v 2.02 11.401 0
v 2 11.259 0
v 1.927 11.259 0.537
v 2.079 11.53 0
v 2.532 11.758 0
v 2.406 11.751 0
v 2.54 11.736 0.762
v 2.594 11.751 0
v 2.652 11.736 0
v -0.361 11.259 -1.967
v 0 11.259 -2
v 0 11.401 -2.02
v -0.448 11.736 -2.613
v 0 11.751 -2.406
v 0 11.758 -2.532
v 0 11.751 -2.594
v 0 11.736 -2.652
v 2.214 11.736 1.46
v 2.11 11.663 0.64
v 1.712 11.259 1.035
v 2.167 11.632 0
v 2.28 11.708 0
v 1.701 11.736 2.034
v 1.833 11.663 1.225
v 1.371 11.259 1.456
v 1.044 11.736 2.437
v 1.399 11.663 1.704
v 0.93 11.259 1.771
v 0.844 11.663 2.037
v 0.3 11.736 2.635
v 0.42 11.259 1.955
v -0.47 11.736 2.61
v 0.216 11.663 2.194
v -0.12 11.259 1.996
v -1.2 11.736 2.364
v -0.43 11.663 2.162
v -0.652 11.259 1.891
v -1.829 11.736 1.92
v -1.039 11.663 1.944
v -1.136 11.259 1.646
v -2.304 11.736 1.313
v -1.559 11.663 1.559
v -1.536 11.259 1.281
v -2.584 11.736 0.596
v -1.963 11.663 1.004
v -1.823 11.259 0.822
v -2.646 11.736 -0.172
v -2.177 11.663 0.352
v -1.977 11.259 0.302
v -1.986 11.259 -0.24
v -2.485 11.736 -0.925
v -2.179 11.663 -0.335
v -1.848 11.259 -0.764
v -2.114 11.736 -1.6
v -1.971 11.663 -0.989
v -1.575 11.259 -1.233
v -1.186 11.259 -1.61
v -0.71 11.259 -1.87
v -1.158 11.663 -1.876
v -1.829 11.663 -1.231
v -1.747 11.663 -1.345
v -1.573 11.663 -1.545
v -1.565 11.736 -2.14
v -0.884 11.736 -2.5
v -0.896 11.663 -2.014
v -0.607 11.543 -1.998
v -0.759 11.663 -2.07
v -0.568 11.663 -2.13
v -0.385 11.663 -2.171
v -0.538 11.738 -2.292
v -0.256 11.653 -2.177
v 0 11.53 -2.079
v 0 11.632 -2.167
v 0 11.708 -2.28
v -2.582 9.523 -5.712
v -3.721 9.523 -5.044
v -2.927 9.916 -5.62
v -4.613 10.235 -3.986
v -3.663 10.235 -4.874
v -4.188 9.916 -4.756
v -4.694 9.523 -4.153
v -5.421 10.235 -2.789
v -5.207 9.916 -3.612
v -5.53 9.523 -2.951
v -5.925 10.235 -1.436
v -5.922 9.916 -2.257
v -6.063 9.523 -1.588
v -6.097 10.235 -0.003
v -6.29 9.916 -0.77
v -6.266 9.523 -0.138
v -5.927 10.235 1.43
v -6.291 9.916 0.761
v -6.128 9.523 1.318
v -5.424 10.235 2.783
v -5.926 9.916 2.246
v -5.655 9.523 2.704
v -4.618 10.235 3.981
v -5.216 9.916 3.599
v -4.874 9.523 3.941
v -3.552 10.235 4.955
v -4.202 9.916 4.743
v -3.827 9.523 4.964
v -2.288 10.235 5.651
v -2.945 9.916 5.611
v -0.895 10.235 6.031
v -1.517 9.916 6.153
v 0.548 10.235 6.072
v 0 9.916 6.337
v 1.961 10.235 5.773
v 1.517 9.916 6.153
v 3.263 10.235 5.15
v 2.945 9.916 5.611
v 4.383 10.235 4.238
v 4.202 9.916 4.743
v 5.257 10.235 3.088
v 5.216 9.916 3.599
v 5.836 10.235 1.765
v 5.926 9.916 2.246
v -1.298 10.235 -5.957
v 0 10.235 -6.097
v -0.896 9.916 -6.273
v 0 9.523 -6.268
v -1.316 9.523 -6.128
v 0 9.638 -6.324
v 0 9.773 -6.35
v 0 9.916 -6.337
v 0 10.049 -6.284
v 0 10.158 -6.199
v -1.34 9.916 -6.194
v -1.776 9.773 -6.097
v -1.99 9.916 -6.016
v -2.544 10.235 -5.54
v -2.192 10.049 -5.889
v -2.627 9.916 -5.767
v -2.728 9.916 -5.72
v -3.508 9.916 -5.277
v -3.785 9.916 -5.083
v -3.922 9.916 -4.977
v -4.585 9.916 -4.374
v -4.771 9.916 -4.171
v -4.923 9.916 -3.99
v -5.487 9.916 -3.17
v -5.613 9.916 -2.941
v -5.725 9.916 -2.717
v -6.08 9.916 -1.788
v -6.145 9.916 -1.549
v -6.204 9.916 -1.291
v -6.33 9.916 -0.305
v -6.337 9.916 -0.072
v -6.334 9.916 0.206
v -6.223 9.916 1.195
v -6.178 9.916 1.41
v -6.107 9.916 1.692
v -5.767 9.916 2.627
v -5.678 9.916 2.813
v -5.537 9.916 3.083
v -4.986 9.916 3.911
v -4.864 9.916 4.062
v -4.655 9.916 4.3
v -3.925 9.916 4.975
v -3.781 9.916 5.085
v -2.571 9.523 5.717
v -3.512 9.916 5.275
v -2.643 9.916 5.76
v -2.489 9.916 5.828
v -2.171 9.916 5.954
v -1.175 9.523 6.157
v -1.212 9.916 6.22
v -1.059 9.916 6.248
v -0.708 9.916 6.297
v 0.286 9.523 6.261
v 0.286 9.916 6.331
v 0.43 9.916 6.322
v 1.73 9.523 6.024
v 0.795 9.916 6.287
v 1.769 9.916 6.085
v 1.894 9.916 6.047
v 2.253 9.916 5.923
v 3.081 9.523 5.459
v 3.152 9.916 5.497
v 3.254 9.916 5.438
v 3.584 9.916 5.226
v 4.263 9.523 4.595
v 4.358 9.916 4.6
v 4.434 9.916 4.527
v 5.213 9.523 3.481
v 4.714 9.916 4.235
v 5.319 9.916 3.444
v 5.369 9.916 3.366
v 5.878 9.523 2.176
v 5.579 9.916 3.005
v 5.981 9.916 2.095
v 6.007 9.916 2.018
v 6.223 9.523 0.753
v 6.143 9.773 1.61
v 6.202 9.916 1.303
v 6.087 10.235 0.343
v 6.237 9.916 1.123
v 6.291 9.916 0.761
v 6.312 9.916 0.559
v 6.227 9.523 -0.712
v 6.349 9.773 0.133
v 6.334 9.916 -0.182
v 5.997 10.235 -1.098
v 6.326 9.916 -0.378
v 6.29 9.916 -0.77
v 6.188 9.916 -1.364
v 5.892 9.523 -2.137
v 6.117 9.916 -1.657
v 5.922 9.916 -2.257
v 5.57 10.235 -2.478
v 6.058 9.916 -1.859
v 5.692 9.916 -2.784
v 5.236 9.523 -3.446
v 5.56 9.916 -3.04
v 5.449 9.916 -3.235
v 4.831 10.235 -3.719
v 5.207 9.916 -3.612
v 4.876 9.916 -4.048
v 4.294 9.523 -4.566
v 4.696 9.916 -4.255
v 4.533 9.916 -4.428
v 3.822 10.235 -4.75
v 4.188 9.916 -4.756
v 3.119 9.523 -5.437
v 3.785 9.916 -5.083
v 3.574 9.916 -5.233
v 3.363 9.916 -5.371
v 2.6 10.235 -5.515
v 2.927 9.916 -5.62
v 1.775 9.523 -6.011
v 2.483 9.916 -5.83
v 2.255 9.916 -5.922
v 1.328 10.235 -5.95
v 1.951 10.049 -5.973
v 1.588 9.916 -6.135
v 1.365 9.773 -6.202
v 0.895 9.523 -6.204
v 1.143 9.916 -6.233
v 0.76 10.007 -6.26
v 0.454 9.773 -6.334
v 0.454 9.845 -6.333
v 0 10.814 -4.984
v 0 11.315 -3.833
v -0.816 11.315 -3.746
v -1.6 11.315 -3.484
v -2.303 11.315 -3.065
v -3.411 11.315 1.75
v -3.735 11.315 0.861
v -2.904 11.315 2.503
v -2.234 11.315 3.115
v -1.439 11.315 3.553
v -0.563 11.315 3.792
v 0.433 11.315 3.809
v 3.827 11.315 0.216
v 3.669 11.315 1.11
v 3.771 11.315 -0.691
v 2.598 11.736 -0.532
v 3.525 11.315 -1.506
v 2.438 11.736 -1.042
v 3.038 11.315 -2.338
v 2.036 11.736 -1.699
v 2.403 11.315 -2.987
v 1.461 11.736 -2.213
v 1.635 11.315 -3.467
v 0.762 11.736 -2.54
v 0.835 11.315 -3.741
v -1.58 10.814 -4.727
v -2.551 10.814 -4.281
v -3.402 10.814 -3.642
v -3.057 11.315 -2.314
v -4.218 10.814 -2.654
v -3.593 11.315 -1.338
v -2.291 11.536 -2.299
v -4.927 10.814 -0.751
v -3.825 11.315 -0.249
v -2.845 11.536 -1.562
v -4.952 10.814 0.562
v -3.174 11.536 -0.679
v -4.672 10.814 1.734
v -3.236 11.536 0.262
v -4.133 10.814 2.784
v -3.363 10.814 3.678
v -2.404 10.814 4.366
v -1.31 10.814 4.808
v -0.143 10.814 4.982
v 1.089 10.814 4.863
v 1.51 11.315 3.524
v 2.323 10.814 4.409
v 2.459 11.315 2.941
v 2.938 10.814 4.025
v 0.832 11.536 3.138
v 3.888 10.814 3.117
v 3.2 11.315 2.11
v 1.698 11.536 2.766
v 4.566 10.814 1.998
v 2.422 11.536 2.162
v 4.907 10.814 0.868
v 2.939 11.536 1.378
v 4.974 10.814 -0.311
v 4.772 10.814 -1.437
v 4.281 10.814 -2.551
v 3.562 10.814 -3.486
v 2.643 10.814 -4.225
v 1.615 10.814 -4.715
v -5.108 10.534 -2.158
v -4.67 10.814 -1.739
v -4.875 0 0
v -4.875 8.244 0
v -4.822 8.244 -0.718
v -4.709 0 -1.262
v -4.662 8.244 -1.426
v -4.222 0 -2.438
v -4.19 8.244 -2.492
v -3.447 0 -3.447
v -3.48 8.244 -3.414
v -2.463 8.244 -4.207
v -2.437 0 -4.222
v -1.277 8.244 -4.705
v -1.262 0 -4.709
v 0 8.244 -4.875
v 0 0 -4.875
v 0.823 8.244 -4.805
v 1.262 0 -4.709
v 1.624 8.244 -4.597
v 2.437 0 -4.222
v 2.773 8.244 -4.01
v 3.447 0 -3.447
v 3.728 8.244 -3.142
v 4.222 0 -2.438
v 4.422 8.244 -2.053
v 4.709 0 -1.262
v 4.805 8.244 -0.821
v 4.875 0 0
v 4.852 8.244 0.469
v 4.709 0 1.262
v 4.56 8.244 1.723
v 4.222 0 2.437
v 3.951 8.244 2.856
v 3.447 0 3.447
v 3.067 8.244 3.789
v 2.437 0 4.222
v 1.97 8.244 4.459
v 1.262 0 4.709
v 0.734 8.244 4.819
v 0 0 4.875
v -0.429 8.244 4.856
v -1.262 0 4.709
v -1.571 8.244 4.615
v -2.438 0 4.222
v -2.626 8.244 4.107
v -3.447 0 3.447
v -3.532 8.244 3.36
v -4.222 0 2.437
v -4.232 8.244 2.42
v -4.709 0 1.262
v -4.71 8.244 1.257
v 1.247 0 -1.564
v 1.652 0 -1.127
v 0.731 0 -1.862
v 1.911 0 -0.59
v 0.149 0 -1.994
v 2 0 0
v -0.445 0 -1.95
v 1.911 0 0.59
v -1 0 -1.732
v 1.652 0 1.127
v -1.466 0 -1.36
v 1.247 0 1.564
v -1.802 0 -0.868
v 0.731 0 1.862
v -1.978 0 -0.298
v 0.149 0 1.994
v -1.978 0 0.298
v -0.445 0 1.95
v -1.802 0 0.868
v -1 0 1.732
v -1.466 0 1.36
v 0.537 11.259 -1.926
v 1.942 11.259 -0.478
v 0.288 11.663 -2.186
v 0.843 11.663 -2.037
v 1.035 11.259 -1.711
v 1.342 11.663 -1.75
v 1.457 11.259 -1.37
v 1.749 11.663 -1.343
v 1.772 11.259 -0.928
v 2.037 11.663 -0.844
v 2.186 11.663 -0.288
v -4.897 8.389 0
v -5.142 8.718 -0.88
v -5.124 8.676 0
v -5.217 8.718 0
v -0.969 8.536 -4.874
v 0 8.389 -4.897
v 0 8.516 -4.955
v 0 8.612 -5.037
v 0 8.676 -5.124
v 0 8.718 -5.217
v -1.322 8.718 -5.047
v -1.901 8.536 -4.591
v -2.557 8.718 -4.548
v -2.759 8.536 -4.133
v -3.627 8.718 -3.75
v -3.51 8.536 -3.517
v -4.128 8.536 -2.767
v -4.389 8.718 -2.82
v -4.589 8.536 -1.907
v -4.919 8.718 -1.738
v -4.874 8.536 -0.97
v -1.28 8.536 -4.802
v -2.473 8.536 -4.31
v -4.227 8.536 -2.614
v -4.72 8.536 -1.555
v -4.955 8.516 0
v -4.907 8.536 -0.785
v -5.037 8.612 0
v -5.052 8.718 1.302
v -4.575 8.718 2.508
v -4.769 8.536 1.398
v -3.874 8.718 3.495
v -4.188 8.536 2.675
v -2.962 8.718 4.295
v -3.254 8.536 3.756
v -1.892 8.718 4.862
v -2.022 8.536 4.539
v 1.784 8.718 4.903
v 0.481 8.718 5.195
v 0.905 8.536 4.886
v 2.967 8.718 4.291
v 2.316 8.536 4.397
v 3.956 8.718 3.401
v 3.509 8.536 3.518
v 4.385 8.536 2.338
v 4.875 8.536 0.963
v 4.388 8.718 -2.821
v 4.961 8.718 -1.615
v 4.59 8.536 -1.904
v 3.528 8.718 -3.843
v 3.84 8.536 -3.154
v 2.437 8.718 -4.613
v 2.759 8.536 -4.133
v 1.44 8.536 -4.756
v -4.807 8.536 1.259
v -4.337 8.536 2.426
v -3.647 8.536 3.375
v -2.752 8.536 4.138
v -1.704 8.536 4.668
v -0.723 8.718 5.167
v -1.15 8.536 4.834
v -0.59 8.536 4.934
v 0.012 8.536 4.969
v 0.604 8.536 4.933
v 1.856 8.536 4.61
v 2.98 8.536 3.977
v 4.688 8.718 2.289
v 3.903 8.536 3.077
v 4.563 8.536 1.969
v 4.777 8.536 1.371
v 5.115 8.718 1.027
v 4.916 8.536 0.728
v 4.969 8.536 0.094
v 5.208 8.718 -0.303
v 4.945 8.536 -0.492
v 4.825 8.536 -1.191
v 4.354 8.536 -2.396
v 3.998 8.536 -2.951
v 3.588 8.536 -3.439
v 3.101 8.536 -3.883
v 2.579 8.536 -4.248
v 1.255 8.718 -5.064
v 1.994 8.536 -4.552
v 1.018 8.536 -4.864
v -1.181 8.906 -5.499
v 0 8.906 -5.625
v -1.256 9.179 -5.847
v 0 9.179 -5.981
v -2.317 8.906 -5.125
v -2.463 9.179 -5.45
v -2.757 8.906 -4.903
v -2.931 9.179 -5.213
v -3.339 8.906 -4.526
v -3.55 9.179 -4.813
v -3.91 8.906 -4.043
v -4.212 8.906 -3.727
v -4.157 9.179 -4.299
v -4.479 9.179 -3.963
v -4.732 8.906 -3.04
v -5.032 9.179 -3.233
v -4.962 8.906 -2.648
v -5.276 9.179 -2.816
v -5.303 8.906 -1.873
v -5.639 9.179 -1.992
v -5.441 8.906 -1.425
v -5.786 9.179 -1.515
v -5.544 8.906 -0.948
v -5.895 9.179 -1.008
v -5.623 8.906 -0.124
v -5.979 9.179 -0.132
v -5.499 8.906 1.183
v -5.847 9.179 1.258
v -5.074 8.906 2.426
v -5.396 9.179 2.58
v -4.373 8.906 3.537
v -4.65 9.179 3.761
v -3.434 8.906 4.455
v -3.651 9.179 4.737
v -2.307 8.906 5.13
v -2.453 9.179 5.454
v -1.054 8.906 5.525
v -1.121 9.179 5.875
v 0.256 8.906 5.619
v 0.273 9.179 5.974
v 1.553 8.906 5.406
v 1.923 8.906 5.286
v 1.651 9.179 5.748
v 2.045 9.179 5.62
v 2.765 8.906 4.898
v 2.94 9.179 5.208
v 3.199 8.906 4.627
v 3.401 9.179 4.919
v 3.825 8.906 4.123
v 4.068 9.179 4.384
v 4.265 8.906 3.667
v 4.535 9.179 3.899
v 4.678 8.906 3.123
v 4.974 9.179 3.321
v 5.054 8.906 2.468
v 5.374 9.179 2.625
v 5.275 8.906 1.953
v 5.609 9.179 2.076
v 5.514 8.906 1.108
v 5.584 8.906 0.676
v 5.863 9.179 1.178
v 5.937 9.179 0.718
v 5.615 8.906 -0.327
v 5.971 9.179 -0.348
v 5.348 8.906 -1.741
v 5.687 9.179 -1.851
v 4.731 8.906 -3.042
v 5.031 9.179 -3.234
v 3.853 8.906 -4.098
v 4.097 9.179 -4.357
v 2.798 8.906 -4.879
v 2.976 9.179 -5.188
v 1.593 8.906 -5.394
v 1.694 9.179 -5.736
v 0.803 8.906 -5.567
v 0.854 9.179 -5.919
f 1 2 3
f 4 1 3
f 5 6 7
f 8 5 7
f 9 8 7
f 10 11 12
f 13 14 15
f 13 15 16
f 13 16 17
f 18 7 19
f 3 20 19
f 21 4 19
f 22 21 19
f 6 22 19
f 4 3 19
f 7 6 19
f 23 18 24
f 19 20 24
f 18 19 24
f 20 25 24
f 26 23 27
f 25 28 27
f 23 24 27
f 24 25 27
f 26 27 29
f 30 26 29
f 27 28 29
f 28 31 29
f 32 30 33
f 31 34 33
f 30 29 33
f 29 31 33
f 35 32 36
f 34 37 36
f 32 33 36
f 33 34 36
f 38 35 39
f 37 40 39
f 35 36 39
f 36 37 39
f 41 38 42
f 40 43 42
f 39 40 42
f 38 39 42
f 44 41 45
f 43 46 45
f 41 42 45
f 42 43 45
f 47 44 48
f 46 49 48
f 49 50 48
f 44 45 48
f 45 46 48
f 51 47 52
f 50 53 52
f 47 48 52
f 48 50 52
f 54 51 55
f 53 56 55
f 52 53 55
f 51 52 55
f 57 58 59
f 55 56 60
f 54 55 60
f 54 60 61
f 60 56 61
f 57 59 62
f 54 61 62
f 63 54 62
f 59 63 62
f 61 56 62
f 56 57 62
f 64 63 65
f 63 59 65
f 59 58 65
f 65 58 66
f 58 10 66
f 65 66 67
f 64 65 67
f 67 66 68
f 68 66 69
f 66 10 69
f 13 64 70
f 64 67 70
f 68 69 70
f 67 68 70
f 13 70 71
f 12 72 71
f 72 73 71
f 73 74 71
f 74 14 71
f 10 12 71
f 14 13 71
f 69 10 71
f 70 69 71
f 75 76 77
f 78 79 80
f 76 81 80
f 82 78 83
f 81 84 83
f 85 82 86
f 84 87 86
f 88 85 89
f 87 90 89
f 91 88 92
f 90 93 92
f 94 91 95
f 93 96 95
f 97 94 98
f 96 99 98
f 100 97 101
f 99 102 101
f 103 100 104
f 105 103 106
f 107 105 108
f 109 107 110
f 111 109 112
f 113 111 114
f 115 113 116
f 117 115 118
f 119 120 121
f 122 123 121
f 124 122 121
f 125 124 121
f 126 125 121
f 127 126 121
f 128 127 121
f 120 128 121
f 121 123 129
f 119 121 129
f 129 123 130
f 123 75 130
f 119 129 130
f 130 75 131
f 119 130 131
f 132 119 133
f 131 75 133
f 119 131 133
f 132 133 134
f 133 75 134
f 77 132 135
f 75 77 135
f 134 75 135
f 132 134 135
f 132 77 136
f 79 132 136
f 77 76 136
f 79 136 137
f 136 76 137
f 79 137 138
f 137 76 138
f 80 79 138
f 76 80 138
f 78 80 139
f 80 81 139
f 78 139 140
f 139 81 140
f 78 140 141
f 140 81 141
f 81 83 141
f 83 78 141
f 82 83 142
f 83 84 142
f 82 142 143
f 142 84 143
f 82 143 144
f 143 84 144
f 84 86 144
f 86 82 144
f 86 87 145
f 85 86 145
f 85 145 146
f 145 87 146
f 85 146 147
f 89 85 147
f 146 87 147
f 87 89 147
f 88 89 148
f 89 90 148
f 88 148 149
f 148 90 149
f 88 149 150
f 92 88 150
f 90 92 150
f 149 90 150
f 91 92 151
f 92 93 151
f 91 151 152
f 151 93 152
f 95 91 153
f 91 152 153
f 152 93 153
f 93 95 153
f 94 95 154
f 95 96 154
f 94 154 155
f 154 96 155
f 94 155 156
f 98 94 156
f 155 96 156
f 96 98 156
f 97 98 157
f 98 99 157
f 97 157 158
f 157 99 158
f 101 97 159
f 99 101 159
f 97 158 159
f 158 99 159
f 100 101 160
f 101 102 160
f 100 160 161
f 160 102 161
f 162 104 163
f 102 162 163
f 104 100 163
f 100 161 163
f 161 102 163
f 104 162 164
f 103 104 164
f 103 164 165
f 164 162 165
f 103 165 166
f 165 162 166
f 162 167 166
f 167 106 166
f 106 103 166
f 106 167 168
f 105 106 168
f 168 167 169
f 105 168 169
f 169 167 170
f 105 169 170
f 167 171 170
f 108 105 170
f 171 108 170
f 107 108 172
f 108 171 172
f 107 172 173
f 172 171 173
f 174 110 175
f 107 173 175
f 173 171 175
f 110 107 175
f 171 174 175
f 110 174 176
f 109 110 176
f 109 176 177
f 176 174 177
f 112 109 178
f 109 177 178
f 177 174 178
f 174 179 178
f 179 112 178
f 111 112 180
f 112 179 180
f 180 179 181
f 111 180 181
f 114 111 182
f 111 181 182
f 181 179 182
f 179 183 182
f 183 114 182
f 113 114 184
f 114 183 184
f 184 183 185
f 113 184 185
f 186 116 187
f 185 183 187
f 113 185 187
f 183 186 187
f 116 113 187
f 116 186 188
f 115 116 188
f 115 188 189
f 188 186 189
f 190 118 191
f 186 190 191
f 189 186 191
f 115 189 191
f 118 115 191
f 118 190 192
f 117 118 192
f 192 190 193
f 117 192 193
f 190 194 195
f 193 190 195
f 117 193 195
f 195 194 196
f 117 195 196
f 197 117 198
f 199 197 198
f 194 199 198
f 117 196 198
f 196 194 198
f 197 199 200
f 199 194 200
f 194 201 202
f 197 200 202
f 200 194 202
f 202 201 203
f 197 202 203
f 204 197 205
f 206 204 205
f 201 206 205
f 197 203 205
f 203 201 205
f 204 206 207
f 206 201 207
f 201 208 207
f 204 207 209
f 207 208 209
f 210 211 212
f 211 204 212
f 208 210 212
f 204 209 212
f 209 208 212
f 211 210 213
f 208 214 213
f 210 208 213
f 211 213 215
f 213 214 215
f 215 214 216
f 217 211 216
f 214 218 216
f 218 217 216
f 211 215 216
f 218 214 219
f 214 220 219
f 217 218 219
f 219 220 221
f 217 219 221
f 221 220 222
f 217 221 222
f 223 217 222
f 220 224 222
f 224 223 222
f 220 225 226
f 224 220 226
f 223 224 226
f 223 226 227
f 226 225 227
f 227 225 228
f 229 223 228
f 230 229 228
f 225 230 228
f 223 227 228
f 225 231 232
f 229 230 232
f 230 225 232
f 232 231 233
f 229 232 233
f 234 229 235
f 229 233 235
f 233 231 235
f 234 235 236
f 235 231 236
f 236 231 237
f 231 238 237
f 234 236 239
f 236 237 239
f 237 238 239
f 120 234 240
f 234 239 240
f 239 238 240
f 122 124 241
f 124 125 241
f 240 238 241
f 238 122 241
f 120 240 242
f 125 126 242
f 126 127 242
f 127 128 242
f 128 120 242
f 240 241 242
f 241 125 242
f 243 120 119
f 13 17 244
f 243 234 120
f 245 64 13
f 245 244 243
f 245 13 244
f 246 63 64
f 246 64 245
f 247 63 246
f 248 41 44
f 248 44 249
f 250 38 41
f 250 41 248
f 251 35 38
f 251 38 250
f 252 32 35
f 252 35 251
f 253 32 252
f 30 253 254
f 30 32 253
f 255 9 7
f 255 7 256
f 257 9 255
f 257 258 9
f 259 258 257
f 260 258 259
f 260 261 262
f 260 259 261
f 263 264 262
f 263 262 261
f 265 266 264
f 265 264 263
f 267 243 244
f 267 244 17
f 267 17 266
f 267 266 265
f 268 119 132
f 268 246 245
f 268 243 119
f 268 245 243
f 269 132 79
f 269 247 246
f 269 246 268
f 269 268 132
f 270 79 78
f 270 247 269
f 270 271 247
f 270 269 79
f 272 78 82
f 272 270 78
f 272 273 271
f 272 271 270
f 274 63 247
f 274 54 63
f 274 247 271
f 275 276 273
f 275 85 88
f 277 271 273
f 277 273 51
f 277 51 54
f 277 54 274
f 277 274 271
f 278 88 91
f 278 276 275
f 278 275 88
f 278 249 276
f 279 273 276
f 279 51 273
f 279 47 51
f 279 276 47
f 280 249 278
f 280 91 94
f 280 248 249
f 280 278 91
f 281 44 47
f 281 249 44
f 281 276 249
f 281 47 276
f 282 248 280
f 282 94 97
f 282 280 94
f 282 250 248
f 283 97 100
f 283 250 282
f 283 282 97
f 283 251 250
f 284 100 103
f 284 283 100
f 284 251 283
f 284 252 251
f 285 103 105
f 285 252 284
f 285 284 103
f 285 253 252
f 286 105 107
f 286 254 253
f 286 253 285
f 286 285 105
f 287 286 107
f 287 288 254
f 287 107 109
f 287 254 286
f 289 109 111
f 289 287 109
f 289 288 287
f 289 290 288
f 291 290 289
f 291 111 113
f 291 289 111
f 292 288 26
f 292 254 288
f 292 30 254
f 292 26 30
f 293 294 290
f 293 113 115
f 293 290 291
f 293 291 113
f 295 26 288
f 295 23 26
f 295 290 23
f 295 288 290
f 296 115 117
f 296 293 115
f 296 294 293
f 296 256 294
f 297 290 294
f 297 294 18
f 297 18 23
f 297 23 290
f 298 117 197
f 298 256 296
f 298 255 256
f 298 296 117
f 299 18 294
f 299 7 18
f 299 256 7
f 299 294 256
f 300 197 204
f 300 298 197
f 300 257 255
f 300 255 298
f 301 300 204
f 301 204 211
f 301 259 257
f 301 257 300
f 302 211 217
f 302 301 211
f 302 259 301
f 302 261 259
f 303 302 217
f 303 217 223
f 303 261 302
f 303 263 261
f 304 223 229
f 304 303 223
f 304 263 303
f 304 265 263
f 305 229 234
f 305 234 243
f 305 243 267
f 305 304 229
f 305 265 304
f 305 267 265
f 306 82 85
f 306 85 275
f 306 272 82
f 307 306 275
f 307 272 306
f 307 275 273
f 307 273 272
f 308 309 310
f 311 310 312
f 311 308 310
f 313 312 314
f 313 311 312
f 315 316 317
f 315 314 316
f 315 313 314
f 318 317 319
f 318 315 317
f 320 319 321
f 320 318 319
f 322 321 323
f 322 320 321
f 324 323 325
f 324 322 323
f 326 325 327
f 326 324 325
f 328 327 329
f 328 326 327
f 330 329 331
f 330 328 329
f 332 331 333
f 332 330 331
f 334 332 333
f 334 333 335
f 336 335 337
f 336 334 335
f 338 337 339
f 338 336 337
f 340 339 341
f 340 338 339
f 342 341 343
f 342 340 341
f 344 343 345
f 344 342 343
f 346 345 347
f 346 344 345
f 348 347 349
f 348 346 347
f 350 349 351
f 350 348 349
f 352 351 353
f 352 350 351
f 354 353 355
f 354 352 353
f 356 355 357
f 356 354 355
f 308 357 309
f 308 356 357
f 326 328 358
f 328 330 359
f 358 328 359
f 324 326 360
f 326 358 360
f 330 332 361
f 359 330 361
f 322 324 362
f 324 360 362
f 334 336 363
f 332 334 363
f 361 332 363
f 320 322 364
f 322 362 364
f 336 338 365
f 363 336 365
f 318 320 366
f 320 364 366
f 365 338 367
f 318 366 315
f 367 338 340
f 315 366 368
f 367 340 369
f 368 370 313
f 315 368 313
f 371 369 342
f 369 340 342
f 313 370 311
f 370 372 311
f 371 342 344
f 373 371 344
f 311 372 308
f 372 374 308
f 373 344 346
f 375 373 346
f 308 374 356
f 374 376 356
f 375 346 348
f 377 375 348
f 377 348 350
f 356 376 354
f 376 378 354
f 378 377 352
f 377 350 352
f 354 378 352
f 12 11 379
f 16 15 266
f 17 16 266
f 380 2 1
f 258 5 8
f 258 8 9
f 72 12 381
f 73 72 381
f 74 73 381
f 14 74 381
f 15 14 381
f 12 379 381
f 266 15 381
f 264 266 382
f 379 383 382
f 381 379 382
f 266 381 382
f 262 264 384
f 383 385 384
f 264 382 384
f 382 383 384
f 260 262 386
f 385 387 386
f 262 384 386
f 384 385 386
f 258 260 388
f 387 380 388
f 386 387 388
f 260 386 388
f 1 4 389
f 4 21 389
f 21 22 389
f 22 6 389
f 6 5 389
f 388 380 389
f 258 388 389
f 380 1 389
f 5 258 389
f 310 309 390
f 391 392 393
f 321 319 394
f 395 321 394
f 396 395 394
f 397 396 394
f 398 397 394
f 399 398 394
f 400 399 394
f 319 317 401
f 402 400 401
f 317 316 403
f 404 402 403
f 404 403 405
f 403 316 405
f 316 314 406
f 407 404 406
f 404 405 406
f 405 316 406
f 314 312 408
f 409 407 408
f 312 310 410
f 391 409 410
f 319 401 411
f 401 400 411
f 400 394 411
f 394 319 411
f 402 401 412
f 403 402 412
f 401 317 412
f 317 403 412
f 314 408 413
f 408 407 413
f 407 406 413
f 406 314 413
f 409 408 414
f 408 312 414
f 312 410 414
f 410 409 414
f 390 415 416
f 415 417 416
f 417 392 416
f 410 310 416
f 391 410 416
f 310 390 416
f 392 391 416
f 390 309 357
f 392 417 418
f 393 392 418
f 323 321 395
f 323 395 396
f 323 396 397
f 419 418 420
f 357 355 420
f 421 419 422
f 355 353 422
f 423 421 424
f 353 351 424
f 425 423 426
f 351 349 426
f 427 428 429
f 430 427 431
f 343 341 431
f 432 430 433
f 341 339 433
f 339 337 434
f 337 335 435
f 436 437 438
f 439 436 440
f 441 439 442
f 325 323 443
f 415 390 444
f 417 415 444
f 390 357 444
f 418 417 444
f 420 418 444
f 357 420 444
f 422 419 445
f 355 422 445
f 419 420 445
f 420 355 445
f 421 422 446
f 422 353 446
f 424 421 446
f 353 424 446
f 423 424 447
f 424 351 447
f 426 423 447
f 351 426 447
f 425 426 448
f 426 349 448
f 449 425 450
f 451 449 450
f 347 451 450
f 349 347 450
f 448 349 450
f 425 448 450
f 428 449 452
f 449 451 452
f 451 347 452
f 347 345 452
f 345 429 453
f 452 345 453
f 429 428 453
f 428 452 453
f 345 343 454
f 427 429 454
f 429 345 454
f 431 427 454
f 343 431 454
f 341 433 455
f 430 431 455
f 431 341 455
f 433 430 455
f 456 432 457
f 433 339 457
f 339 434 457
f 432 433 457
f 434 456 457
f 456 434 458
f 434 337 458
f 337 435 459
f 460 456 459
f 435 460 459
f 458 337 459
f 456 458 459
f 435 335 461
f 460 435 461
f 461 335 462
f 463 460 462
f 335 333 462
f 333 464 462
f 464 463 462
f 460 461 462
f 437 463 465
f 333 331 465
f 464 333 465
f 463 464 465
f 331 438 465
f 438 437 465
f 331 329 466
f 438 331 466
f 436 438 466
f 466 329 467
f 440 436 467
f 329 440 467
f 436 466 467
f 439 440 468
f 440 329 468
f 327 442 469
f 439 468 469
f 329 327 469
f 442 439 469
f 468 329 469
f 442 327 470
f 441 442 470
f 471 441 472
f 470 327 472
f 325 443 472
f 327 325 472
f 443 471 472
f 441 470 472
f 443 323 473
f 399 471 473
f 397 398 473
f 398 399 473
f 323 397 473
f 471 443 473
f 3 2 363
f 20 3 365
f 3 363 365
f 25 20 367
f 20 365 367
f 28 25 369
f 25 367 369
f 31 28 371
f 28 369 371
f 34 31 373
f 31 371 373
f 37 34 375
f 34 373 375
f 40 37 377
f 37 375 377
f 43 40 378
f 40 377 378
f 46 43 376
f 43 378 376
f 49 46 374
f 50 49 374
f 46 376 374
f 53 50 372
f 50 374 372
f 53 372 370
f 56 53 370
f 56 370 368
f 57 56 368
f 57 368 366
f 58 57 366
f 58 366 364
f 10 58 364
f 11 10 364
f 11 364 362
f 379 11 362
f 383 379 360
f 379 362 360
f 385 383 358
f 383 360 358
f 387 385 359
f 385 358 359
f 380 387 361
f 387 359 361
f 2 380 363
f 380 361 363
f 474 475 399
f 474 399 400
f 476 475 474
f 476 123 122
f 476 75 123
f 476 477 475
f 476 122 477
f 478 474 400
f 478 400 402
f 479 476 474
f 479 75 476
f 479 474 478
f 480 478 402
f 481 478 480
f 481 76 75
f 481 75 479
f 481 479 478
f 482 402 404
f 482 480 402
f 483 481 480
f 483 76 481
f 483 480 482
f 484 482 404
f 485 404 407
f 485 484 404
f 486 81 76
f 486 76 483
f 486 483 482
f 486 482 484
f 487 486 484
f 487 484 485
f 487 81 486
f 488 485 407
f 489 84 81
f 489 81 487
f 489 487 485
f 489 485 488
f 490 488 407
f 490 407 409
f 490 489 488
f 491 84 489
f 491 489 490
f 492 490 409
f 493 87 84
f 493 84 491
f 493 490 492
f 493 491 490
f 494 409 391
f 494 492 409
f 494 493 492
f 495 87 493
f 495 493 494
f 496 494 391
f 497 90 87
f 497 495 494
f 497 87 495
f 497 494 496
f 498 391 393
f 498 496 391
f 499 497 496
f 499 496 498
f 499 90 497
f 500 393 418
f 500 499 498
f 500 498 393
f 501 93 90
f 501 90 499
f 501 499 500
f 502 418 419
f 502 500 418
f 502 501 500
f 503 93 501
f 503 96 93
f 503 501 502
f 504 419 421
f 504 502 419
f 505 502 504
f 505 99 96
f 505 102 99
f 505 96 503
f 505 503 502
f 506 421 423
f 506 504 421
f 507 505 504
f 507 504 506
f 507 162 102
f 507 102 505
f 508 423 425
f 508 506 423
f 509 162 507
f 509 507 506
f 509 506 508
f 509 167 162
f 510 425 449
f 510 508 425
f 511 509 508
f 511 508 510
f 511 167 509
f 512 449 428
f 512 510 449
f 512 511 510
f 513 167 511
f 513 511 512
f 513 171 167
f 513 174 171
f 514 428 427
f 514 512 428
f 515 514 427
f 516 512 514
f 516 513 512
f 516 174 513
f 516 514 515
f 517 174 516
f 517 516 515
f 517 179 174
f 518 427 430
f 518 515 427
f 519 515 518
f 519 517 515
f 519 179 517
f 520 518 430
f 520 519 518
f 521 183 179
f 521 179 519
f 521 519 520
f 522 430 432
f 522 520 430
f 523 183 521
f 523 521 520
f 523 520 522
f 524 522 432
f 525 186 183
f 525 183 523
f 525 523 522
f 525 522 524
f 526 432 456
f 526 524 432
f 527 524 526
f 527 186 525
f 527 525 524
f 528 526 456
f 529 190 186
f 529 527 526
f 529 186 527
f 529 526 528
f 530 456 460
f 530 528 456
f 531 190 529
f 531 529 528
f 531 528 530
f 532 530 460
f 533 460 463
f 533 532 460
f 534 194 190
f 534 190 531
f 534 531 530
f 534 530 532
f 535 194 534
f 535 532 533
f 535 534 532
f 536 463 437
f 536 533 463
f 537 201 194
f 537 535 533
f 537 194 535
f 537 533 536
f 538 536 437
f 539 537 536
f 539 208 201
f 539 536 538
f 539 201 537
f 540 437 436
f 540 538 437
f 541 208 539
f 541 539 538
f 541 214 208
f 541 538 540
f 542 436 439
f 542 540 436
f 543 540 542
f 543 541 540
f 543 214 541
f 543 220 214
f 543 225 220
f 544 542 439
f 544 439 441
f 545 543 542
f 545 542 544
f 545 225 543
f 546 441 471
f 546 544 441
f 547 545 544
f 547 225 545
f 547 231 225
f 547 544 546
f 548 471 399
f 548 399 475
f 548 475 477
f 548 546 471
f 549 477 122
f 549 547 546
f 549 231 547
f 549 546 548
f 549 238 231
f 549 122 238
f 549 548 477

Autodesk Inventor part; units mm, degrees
ref_plane "YZ Plane" through (0, 0, 0) normal (1, 0, 0) x (0, 1, 0)
ref_plane "XZ Plane" through (0, 0, 0) normal (0, 1, 0) x (-1, 0, 0)
ref_plane "XY Plane" through (0, 0, 0) normal (0, 0, 1) x (1, 0, 0)
sketch "Sketch1" plane through (0, 0, 0) normal (0, 1, 0) x (-1, 0, 0)
  circle A0 centre (0, 0) radius 4.875
  dimension "d0" = 9.75
extrude "Extrusion1" add sketch "Sketch1" along normal blind 10
sketch "Sketch2" plane through (0, 0, 0) normal (1, 0, 0) x (0, 1, 0)
  line L0 (0, 0) -> (10, 0)
  line L1 (10, -4.875) -> (10, 4.875) projected
  line L2 (10, 0) -> (10, -6.5)
  arc A0 (10, -6.5) -> (12.3658, 0) centre (-5.6698, 2.8839) ccw
  line L3 (10, -6.5) -> (12.3658, 0) construction
  line L4 (10, -6.5) -> (16.9172, -6.5) construction
  line L5 (0, -4.875) -> (10, -4.875) projected
  arc A1 (8.6365, -4.875) -> (10, -6.5) centre (10.6414, -4.5773) ccw
  line L6 (10, -6.5) -> (8.6365, -4.875) construction
  line L7 (10, -6.5) -> (12.1213, -6.5) construction
  line L8 (8.6365, -4.875) -> (8.6365, 0)
  line L9 (12.3658, 0) -> (8.6365, 0)
  line L10 (12.3658, 0) -> (0, 0)
  line L11 (0, -4.875) -> (0, 4.875) projected
  dimension "d8" = 6.5
  dimension "d9" = 70
  dimension "d10" = 130
revolve "Revolution1" add sketch "Sketch2" angle 360 about axis through (0, 0, 0) along (0, 1, 0) contours L9 A0 L2 L1 | L5 L2 A1
sketch "Sketch4" plane through (0, 0, 0) normal (0, -1, 0) x (1, 0, 0)
  circle A0 centre (0, 0) radius 2
  dimension "d11" = 4
extrude "Extrusion2" cut sketch "Sketch4" against normal through all
fillet "Fillet2" radius 0.5 5 edges at (0, 10, 6.5) (1.4142, 11.9298, -1.4142) (-1.4141, 11.9298, 1.4143) (-3.4471, 8.6365, -3.4471) (3.4471, 8.6365, 3.4471)
properties part number "Part3pasador"
